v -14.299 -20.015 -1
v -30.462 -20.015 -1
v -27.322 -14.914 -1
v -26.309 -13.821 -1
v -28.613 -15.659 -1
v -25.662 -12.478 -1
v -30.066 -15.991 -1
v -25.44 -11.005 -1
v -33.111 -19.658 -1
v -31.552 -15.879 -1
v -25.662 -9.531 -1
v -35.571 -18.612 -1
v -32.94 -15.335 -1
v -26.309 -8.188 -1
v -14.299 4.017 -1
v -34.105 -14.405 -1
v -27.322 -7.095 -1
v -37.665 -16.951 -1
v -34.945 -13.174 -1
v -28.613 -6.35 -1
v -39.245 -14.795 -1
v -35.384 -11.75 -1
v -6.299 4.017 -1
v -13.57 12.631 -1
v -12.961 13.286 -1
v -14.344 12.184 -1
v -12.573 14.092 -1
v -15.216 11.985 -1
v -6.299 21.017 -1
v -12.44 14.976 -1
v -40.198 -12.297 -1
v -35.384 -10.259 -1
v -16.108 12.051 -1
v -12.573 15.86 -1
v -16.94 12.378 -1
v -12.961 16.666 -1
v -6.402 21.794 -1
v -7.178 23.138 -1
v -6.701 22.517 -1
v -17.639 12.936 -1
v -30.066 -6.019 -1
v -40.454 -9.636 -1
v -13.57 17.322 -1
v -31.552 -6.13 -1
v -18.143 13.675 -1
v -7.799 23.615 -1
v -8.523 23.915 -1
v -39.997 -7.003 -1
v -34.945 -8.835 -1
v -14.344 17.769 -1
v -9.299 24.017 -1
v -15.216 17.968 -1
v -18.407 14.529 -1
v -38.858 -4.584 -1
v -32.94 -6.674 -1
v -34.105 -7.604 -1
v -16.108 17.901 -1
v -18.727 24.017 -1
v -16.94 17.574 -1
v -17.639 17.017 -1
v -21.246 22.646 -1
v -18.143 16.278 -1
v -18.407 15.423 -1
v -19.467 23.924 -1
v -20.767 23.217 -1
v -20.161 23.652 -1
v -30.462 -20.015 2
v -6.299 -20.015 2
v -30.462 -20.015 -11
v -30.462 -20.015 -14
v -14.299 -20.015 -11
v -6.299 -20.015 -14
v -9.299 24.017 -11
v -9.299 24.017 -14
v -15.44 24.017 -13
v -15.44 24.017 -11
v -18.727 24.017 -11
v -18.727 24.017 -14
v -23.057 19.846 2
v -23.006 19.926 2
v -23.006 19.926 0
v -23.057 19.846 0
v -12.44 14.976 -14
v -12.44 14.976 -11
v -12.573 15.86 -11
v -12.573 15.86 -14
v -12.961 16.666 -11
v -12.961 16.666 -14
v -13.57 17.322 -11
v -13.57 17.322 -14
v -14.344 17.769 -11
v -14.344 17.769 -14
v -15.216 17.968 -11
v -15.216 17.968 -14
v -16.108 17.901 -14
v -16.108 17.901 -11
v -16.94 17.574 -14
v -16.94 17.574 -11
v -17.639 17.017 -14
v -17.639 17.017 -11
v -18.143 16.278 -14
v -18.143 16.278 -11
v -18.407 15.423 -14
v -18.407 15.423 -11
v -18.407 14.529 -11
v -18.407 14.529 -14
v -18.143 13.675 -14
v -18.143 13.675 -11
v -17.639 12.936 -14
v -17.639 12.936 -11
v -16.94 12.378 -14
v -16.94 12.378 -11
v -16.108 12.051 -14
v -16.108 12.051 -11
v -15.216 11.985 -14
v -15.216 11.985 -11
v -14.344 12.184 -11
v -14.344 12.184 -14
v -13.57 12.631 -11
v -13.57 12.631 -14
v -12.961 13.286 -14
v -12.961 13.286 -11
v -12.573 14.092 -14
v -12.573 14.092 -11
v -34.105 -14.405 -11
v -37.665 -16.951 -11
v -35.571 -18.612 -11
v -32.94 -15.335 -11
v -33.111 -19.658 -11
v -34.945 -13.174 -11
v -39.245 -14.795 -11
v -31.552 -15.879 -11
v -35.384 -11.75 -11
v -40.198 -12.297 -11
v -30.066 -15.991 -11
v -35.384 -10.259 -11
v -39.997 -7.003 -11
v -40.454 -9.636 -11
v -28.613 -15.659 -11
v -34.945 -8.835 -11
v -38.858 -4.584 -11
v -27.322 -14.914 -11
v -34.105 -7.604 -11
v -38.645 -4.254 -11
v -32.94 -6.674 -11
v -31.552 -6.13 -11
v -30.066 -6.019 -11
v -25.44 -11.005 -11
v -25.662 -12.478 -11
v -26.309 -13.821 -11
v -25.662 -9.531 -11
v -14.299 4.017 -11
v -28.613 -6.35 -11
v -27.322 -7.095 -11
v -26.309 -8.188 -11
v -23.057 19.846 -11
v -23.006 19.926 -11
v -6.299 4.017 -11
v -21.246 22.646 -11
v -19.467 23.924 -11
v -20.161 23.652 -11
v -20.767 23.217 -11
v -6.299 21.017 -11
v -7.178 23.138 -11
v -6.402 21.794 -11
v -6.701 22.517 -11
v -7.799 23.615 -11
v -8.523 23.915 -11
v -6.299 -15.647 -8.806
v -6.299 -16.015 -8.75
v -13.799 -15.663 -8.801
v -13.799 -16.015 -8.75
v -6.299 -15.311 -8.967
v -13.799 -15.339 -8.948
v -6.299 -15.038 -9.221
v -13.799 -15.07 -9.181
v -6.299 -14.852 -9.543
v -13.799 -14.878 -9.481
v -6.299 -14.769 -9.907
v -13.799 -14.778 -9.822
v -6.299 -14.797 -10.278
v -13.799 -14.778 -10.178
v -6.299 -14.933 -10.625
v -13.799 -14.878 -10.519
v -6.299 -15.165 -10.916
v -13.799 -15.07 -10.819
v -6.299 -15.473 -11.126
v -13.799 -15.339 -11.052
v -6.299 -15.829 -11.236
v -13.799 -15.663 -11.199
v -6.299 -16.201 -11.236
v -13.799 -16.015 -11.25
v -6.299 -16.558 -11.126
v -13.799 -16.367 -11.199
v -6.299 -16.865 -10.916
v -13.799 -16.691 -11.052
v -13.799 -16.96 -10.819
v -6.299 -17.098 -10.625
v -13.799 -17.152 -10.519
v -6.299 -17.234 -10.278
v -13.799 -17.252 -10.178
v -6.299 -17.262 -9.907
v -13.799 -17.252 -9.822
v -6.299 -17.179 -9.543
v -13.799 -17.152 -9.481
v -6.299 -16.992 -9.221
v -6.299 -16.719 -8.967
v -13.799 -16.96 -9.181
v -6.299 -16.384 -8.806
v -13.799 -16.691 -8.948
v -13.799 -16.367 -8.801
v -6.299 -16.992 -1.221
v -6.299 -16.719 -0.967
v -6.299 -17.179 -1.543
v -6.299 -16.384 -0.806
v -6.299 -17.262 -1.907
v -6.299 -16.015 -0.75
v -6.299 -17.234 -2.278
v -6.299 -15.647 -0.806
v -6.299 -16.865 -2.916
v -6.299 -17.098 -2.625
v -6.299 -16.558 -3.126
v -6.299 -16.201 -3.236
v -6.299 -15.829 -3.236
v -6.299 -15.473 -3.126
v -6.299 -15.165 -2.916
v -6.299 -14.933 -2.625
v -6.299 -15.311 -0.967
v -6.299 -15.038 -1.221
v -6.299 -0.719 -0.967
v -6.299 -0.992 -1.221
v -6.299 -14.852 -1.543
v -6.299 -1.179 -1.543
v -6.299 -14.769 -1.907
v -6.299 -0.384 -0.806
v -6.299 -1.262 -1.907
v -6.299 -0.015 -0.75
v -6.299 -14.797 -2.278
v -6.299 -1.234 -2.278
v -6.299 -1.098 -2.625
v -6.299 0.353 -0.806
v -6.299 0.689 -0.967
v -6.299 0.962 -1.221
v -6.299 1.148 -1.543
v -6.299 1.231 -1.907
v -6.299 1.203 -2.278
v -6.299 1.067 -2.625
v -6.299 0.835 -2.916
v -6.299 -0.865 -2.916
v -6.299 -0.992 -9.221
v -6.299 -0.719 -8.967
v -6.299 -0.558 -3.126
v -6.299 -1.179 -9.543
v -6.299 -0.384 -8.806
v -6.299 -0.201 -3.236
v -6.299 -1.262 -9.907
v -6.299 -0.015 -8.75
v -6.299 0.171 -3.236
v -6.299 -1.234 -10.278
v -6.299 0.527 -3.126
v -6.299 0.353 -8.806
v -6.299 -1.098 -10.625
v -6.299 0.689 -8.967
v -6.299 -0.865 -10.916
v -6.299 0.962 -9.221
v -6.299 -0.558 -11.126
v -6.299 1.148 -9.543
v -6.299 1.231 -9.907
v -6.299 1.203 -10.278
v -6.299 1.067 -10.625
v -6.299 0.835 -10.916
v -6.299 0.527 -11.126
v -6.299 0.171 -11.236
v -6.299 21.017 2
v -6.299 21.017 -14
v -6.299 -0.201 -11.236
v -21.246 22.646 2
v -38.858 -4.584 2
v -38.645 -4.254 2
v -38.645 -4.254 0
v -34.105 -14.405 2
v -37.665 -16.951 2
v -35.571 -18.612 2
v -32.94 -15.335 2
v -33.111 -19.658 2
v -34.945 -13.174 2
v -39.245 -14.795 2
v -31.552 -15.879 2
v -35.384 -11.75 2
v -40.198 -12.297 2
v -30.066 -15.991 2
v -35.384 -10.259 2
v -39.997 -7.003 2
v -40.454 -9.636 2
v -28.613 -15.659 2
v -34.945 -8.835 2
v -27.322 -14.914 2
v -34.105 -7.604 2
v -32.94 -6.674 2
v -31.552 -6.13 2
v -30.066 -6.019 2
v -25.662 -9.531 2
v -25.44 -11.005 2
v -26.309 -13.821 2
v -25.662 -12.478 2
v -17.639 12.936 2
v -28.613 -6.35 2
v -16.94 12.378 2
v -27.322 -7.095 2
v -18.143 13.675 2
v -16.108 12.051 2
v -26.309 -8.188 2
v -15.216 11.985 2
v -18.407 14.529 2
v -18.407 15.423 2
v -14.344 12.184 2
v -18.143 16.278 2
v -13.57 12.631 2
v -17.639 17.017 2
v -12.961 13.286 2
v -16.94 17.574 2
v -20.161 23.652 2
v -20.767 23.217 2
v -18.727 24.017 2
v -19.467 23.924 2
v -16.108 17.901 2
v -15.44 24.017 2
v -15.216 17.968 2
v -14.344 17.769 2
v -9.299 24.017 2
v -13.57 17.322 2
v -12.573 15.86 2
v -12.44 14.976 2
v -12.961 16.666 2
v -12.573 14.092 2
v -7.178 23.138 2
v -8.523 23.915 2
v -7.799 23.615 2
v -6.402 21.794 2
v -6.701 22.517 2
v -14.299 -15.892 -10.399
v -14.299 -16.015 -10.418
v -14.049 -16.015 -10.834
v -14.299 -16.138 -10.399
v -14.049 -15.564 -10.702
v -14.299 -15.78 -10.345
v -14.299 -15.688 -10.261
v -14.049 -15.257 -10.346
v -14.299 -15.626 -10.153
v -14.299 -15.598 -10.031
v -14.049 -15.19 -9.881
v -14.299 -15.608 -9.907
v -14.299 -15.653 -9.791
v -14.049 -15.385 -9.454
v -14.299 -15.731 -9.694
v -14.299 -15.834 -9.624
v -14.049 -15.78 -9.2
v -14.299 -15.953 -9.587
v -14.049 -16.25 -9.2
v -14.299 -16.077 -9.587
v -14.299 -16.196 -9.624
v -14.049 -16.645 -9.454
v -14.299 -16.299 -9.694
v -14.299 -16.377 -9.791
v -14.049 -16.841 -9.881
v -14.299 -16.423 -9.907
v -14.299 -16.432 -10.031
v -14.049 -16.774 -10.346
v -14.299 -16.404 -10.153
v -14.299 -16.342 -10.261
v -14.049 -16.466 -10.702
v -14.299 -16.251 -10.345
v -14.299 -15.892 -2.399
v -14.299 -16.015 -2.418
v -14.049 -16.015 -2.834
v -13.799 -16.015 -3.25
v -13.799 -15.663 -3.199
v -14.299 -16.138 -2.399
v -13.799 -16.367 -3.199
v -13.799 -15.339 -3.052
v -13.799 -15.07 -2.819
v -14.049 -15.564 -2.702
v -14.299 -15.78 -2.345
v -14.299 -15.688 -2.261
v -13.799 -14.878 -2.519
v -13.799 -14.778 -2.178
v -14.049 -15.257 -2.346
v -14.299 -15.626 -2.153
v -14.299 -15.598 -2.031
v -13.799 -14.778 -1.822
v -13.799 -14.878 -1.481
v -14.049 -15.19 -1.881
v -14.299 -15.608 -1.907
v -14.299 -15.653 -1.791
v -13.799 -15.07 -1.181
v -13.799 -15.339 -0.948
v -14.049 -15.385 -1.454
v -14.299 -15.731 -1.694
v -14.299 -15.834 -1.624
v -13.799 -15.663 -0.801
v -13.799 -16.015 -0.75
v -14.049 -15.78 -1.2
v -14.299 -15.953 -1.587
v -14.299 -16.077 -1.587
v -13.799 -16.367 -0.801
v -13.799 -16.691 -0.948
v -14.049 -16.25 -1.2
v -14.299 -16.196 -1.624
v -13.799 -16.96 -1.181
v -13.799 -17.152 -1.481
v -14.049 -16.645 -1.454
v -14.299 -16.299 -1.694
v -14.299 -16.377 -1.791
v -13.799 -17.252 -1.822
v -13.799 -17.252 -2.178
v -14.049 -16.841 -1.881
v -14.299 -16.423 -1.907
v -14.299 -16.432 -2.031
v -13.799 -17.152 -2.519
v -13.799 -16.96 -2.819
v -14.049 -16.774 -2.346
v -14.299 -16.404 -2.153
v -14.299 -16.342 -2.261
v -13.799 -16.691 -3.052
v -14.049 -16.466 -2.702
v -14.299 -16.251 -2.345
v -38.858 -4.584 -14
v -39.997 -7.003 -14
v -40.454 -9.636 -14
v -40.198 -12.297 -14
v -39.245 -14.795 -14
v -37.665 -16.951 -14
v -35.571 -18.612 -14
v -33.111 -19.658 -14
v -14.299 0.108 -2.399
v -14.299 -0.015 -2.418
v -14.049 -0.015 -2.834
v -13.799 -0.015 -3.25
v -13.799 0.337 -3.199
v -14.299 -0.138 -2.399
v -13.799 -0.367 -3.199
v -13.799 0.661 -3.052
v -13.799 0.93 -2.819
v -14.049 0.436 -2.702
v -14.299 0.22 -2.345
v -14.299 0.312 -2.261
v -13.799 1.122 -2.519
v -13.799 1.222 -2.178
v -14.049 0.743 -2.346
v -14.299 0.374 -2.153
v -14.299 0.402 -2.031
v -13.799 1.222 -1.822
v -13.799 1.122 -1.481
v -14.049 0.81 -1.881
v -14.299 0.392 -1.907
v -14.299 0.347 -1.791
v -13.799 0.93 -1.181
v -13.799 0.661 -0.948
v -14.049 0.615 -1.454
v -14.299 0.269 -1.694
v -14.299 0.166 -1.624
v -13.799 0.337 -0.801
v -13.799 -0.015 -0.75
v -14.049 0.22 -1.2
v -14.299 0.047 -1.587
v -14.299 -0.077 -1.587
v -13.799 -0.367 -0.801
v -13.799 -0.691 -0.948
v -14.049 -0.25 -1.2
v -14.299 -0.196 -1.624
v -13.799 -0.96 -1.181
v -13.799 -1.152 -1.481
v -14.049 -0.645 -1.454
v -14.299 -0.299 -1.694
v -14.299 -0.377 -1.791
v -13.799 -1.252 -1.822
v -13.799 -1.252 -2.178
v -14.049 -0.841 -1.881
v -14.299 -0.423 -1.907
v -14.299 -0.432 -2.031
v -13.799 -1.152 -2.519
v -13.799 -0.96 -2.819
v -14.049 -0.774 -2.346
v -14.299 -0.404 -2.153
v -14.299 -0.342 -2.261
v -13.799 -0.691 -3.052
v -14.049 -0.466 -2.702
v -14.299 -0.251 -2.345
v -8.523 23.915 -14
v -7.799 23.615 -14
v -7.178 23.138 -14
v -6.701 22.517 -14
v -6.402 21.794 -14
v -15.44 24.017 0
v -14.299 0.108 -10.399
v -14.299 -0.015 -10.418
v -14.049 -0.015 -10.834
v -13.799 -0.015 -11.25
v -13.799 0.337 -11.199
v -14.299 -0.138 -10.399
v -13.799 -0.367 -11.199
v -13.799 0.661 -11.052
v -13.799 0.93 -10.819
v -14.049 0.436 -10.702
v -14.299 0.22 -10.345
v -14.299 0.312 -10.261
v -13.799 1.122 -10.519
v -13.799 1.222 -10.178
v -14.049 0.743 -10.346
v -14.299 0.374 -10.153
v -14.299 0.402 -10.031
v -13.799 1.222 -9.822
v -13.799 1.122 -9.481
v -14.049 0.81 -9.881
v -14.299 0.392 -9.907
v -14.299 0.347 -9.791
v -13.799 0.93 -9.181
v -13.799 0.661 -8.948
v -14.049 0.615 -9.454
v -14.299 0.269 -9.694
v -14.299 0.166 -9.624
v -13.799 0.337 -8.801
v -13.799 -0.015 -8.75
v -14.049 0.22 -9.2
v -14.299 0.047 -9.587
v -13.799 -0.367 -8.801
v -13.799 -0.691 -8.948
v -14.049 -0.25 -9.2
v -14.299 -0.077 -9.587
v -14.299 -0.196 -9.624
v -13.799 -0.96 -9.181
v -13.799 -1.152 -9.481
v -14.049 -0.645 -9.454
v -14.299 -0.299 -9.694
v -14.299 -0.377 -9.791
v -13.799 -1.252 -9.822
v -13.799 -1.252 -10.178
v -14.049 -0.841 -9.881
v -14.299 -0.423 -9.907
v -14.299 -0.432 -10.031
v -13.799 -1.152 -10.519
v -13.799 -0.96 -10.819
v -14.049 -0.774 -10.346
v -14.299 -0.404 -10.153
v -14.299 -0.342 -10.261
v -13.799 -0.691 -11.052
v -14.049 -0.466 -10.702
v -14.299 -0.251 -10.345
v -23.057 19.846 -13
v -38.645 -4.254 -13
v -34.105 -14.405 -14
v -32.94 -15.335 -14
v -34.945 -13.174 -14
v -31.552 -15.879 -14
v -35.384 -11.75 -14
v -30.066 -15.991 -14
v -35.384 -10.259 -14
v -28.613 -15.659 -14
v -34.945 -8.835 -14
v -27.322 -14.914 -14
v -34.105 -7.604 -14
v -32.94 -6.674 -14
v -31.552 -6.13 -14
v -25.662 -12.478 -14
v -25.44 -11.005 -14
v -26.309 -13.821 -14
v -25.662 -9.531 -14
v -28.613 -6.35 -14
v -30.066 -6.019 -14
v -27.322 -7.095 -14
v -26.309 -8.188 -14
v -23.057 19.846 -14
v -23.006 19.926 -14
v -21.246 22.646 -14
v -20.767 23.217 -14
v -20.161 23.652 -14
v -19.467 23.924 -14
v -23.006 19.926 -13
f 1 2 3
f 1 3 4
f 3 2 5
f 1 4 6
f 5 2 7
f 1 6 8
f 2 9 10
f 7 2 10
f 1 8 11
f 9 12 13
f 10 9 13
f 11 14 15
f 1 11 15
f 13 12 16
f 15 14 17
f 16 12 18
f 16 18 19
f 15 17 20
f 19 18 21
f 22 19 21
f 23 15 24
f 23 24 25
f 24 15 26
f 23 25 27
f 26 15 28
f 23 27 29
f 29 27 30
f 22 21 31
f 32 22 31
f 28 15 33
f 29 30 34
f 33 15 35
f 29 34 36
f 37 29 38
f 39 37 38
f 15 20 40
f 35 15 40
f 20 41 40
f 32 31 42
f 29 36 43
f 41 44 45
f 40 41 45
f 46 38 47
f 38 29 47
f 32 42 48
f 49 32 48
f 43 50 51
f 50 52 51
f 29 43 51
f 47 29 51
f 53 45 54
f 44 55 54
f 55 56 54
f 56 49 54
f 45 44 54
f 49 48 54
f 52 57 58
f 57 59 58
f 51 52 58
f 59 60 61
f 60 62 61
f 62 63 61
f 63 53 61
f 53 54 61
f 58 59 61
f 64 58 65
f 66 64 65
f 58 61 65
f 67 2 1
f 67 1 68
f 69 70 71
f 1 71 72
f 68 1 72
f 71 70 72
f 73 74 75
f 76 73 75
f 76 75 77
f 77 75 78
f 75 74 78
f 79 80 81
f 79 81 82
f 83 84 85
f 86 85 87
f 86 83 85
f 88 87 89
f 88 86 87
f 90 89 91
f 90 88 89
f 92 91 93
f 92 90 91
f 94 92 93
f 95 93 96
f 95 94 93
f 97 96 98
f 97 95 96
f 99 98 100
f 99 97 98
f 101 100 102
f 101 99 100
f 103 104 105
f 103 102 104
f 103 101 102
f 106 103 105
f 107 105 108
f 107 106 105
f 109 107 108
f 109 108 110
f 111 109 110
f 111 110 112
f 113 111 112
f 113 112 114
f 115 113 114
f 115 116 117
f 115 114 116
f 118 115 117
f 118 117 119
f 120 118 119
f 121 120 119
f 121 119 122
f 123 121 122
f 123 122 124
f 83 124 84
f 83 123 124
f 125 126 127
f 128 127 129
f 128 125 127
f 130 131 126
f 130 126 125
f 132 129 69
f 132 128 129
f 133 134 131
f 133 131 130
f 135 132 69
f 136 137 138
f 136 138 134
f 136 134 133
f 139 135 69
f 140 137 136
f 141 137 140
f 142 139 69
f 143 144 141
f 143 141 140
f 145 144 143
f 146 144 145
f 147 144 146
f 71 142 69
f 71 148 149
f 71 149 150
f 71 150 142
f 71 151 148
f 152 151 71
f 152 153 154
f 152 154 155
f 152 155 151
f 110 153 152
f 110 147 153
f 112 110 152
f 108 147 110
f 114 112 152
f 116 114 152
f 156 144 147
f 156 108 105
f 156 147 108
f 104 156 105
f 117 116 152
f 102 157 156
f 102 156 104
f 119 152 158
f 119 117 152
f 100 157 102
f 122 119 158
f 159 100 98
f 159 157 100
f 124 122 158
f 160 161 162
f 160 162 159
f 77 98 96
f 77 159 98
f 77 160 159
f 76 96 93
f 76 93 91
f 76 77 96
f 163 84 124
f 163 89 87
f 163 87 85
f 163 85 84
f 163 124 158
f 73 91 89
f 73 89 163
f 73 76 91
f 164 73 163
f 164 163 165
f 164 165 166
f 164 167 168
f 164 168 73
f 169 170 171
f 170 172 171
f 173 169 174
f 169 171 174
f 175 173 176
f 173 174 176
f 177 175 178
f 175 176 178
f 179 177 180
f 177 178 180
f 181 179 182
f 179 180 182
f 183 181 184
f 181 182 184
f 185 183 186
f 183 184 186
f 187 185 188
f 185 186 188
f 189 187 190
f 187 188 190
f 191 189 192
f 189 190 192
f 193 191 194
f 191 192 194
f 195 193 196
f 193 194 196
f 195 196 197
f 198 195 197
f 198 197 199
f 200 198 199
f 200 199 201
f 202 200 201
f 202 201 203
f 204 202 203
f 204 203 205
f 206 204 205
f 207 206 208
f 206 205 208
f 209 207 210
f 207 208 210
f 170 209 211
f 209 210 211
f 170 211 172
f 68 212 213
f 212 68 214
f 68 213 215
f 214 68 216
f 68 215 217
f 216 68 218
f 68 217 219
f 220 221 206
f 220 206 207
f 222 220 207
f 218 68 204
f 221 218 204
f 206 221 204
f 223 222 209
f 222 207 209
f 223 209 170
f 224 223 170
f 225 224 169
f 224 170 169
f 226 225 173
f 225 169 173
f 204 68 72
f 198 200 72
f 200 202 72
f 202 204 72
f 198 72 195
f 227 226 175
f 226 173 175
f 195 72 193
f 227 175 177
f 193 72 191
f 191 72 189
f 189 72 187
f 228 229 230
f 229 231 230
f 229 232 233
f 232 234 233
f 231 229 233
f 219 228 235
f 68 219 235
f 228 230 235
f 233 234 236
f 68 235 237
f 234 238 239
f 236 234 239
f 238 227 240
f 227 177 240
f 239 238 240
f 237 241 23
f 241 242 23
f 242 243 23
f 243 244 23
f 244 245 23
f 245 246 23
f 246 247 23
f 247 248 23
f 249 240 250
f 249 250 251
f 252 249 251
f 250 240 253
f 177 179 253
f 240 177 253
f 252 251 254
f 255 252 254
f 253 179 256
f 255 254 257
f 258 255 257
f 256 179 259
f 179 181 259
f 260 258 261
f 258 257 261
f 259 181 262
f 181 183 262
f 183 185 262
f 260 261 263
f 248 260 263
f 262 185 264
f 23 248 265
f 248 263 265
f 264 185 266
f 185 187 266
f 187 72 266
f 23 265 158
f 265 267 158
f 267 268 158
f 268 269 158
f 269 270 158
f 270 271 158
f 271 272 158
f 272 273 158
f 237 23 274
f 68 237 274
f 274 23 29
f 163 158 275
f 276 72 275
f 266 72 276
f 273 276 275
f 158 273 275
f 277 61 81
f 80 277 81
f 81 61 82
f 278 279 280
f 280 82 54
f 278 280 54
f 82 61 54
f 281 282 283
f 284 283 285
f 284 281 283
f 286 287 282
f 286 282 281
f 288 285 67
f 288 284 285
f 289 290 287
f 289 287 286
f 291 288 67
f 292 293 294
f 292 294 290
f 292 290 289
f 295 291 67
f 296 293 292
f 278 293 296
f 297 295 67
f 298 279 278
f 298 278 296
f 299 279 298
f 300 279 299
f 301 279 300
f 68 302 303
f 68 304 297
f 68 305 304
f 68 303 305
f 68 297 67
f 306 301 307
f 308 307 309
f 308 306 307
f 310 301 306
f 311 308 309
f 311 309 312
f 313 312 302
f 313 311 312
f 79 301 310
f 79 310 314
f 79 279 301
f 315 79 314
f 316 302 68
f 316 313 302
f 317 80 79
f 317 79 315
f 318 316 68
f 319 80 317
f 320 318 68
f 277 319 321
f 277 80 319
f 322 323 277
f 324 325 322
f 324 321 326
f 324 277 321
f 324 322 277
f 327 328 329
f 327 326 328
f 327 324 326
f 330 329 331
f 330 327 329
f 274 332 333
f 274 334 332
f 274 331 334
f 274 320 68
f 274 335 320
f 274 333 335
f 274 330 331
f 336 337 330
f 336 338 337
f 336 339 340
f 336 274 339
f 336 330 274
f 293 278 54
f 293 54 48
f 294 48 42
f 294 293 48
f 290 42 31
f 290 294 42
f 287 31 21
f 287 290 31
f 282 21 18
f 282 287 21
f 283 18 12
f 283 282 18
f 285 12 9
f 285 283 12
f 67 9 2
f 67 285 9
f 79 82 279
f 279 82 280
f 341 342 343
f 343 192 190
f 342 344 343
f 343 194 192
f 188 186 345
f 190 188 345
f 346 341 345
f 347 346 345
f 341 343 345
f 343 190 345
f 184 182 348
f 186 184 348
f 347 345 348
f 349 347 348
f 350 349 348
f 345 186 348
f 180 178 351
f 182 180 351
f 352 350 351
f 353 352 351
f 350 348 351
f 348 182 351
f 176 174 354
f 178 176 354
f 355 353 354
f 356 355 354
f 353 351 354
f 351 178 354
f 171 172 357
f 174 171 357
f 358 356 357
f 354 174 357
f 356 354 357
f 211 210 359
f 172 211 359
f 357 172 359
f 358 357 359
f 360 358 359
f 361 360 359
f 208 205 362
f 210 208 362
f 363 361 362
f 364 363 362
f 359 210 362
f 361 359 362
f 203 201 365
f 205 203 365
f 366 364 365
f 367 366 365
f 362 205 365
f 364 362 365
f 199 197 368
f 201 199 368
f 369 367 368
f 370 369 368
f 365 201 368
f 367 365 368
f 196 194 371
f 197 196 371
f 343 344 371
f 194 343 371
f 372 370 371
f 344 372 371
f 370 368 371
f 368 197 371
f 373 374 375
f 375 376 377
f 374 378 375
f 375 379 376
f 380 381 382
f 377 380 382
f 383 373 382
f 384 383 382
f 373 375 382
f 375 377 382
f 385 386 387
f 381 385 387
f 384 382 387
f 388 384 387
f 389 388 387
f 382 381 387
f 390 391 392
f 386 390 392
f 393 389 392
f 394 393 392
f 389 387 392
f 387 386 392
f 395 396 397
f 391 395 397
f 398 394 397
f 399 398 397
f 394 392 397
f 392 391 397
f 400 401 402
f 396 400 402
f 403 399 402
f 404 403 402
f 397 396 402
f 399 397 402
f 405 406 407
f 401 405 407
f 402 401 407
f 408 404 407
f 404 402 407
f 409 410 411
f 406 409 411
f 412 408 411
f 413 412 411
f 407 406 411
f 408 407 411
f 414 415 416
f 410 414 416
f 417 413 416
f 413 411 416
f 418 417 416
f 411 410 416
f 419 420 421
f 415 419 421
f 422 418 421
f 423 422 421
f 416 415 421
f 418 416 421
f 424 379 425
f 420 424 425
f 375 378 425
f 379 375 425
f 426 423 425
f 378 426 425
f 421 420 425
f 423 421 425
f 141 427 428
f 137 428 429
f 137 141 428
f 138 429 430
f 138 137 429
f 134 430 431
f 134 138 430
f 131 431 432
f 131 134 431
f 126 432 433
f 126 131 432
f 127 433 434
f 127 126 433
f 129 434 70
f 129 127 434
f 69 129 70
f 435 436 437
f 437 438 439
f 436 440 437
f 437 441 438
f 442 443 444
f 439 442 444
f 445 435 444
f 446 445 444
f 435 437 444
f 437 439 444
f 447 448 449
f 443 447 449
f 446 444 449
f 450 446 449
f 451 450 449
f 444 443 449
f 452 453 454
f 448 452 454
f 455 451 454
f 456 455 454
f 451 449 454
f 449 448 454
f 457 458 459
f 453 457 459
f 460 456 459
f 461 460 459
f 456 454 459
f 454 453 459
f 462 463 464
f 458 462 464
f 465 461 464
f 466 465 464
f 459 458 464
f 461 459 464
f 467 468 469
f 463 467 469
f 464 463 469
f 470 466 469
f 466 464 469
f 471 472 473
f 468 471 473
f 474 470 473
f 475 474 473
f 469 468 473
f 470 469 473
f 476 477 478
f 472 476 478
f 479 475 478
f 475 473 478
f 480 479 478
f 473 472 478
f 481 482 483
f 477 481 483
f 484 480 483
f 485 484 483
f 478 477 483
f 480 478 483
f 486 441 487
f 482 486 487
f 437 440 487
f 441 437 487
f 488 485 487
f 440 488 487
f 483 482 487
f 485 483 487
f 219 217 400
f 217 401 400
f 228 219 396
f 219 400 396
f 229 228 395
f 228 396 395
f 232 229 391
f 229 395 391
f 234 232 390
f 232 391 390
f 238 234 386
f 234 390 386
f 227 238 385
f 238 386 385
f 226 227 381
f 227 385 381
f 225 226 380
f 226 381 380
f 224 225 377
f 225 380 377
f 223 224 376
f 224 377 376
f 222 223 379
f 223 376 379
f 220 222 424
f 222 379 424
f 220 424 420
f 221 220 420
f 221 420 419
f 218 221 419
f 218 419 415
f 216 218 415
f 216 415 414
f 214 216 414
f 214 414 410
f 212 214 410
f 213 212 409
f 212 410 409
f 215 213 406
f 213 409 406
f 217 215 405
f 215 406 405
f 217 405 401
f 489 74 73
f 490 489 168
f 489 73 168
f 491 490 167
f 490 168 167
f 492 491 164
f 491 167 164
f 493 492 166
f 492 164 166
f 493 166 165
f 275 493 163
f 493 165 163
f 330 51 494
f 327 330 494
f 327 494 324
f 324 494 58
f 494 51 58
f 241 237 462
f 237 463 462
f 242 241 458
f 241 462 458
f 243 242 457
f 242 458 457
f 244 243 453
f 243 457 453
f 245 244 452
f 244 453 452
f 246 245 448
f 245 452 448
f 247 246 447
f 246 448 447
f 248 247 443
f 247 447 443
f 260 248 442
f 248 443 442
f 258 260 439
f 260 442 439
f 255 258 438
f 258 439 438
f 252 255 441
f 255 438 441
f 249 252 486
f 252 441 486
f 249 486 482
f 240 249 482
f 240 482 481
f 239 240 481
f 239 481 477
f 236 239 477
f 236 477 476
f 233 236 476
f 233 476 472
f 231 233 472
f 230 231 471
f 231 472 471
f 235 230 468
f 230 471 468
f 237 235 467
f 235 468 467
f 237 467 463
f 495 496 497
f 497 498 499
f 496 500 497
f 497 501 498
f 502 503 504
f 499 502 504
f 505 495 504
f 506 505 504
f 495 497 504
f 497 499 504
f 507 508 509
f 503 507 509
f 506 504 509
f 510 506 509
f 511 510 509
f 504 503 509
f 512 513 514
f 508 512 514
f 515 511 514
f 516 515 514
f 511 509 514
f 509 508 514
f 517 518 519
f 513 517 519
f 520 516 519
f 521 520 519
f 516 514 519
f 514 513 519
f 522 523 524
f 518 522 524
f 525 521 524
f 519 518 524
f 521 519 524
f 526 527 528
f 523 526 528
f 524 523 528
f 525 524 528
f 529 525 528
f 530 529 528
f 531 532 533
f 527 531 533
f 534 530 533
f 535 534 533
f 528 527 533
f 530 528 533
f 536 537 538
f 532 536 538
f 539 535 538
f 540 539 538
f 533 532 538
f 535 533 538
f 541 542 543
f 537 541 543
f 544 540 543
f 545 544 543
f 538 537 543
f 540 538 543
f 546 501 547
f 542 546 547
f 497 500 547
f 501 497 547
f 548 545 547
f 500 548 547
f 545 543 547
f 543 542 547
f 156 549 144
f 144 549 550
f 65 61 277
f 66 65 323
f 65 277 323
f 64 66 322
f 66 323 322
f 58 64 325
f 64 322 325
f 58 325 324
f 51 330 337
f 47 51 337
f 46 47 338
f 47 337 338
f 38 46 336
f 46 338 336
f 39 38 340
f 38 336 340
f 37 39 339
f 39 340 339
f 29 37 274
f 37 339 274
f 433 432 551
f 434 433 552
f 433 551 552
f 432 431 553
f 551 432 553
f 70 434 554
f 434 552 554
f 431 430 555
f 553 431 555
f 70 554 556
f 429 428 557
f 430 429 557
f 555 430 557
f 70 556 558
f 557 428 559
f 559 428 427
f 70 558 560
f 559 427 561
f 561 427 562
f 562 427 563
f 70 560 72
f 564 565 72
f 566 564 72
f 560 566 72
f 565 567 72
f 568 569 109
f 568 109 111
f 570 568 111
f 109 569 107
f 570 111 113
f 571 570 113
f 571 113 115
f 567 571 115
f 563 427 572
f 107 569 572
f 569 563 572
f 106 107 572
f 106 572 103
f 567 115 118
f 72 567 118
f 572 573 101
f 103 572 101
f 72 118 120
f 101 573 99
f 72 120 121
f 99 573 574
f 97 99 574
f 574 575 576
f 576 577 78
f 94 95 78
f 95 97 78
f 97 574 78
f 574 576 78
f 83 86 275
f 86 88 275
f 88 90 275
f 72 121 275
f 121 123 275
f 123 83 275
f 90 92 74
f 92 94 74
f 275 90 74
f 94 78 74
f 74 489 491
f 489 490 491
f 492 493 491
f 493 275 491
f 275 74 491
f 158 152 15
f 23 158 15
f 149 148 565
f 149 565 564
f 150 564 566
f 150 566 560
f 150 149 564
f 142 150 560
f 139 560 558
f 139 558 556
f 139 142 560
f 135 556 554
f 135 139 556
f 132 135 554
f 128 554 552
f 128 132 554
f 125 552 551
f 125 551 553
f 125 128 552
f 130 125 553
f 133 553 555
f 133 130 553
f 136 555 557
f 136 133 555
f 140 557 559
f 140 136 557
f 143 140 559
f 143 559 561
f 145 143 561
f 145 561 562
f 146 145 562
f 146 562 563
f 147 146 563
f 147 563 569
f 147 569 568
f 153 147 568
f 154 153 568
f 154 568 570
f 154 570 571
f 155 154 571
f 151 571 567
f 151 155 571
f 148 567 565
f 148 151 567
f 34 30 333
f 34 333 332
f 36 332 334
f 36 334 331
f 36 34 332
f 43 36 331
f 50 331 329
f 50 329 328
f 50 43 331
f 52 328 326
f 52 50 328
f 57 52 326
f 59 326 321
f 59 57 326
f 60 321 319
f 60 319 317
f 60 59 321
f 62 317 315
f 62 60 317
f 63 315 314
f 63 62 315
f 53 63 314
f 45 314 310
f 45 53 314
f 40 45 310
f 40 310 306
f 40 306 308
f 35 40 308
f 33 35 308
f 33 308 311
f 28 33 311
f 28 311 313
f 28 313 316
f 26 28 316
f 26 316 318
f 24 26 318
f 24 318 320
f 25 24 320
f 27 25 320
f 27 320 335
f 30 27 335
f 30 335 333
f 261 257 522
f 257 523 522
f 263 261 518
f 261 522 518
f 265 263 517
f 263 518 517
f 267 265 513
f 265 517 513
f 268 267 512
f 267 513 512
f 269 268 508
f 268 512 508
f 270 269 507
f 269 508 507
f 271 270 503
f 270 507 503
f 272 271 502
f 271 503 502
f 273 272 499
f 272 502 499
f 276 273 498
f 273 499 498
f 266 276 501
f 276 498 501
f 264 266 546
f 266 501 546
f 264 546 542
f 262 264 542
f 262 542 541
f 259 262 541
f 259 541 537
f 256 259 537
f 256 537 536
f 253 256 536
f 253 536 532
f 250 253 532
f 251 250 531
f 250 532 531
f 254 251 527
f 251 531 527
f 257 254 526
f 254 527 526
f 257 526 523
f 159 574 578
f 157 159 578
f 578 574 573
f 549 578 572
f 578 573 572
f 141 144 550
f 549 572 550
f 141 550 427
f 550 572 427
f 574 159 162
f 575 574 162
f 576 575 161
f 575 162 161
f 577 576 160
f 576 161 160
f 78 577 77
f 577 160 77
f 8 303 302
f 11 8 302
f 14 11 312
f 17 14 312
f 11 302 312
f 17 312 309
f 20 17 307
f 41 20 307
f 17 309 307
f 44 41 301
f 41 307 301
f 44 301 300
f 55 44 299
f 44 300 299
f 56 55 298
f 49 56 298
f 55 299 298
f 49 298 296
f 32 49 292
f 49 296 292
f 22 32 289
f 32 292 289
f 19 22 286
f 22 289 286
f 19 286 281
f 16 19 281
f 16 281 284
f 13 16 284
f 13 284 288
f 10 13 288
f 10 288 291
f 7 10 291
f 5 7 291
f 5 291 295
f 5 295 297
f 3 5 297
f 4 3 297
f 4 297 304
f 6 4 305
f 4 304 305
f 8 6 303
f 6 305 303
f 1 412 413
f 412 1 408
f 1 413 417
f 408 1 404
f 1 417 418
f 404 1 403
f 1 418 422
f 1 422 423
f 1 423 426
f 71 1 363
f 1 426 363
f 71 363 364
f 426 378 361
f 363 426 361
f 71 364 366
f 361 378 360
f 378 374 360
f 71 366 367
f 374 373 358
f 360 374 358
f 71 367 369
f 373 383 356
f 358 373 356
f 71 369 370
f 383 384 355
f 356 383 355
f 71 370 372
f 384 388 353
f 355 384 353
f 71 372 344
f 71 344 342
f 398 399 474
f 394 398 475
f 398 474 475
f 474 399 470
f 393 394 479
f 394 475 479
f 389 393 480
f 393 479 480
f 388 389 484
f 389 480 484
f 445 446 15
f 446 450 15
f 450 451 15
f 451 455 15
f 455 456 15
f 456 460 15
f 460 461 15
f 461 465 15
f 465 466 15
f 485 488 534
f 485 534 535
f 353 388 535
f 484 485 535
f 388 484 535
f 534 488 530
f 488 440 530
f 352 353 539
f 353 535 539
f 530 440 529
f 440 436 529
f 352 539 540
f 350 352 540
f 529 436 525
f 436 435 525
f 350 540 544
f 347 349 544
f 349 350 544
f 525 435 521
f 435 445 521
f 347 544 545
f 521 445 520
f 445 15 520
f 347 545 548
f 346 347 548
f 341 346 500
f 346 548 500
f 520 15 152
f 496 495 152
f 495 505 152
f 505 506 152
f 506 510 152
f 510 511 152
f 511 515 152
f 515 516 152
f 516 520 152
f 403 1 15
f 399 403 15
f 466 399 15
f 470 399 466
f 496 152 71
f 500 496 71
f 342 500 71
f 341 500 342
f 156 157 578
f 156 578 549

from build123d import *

# Parameters (mm, degrees)
SKETCH_1_R             = 3
EXTRUDE_1_DEPTH        = 2
SKETCH_2_W             = 53.96
SKETCH_2_H             = 15
SKETCH_2_R             = 1.6
SKETCH_2_R_2           = 1
EXTRUDE_2_DEPTH        = 2
PATTERN_LINEAR_1_COUNT = 2
PATTERN_LINEAR_1_PITCH = 13
FILLET_1_R             = 1
EXTRUDE_START          = -16
SKETCH_4_R             = 3
EXTRUDE_3_DEPTH        = 16
SKETCH_5_W             = 71.597299473
SKETCH_5_H             = 10
CUT_EXTRUDE_1_DEPTH    = 15
SKETCH_6_R             = 5
CUT_EXTRUDE_2_DEPTH    = 3
CUT_EXTRUDE_START      = -3
SKETCH_7_R             = 5
CUT_EXTRUDE_3_DEPTH    = 3
FILLET_2_R             = 10
SKETCH_8_W             = 2
SKETCH_8_H             = 0.095117033
EXTRUDE_5_DEPTH        = 0.002
CUT_EXTRUDE_4_DEPTH    = 16
FILLET_3_R             = 3
CUT_EXTRUDE_5_REACH    = 63.416
SKETCH_11_W            = 36.223911337
SKETCH_11_H            = 10
SKETCH_14_W            = 10
SKETCH_14_H            = 20
CUT_EXTRUDE_6_DEPTH    = 8
HOLE_WIZARD_M3_1_D     = 2.5
HOLE_WIZARD_M3_1_DEPTH = 7.5
HOLE_WIZARD_M3_1_TIP   = 0.751075774


with BuildPart() as part:
    # 草图1 → 凸台-拉伸1 (new body)
    with BuildSketch(Plane.XY):
        with BuildLine():
            Line((-31.667580782, -19.712759913), (-15.214545893, -22.177554229))
            Line((-15.214545893, -22.177554229), (-14.362700527, -22.30516738))
            Line((-14.362700527, -22.30516738), (-14.362700527, -23.166518437))
            Line((-14.362700527, -23.166518437), (-14.362700527, -25.01516738))
            Line((-14.362700527, -25.01516738), (39.597299473, -25.01516738))
            Line((39.597299473, -25.01516738), (39.597299473, -20.01516738))
            Line((39.597299473, -20.01516738), (-6.399297664, -20.01516738))
            Line((-6.399297664, -20.01516738), (-6.399297664, 14.684969608))
            ThreePointArc((-6.399297664, 14.684969608), (-6.397869517, 15.219044335), (-6.427963434, 15.752272438))
            ThreePointArc((-6.427963434, 15.752272438), (-6.435285609, 15.800138476), (-6.441446817, 15.848167752))
            ThreePointArc((-6.441446817, 15.848167752), (-13.325191112, 23.766199394), (-23.057324529, 19.846156059))
            Line((-23.057324529, 19.846156059), (-38.645044316, -4.254376507))
            ThreePointArc((-38.645044316, -4.254376507), (-39.369264732, -13.885171984), (-31.667580782, -19.712759913))
        make_face()
        with Locations((-30.439815615, -11.004528038)):
            Circle(SKETCH_1_R, mode=Mode.SUBTRACT)
        with Locations((-15.440178747, 14.976184715)):
            Circle(SKETCH_1_R, mode=Mode.SUBTRACT)
    extrude_1 = extrude(amount=EXTRUDE_1_DEPTH)

    # 草图2 → 凸台-拉伸2 (add)
    with BuildSketch(Plane.XZ.offset(25.01516738)):
        with Locations((12.617299473, -5.5)):
            Rectangle(SKETCH_2_W, SKETCH_2_H)
        with Locations(Location((26.637299473, -5.5, 0), (0, 0, 270))):
            Circle(SKETCH_2_R, mode=Mode.SUBTRACT)
        with Locations(Location((-9.362700527, -5.5, 0), (0, 0, 270))):
            Circle(SKETCH_2_R, mode=Mode.SUBTRACT)
        with Locations(Location((-3.141180602, -5.5, 0), (0, 0, 270))):
            Circle(SKETCH_2_R_2, mode=Mode.SUBTRACT)
        with Locations(Location((20.358819398, -5.5, 0), (0, 0, 270))):
            Circle(SKETCH_2_R_2, mode=Mode.SUBTRACT)
        with BuildLine():
            Line((3.367759388, -1.25), (-1.491180602, -1.25))
            Line((-1.491180602, -1.25), (-1.491180602, -9.75))
            Line((-1.491180602, -9.75), (3.367759388, -9.75))
            ThreePointArc((3.367759388, -9.75), (6.858819398, -11), (10.349879409, -9.75))
            Line((10.349879409, -9.75), (18.708819398, -9.75))
            Line((18.708819398, -9.75), (18.708819398, -1.25))
            Line((18.708819398, -1.25), (10.349879409, -1.25))
            ThreePointArc((10.349879409, -1.25), (6.858819398, 0), (3.367759388, -1.25))
        make_face(mode=Mode.SUBTRACT)
    extrude(amount=-EXTRUDE_2_DEPTH)

    # 阵列(线性)1: 凸台-拉伸1 ×2
    with Locations(*[(0, 0, -i * PATTERN_LINEAR_1_PITCH) for i in range(1, PATTERN_LINEAR_1_COUNT)]):
        add(extrude_1)

    # 圆角1
    fillet_1_edges = [part.edges().sort_by_distance(p)[0] for p in [
        (-14.362700527, -22.30516738, -12),
    ]]
    fillet(fillet_1_edges, radius=FILLET_1_R - 0.0004)  # a hair under: the kernel refuses the full size

    # 草图4 → 凸台-拉伸3 (add)
    with BuildSketch(Plane.XY.offset(2).offset(EXTRUDE_START)):
        Polygon((-20.359667451, 24.017065798), (-48.838793814, -20.01516738), (-6.299297664, -20.01516738), (-6.299297664, 24.017065798), align=None)
        with Locations((-15.440178747, 14.976184715)):
            Circle(SKETCH_4_R, mode=Mode.SUBTRACT)
        with Locations((-30.439815615, -11.004528038)):
            Circle(SKETCH_4_R, mode=Mode.SUBTRACT)
    extrude(amount=EXTRUDE_3_DEPTH)

    # 草图5 → 切除-拉伸1 (cut)
    with BuildSketch(Plane.XY.offset(2)):
        with Locations((3.798649736, -25.01516738)):
            Rectangle(SKETCH_5_W, SKETCH_5_H)
    extrude(amount=-CUT_EXTRUDE_1_DEPTH, mode=Mode.SUBTRACT)

    # 草图6 → 切除-拉伸2 (cut)
    with BuildSketch(Plane.XY.offset(2)):
        with Locations((-30.439815615, -11.004528038)):
            Circle(SKETCH_6_R)
    extrude(amount=-CUT_EXTRUDE_2_DEPTH, mode=Mode.SUBTRACT)

    # 草图7 → 切除-拉伸3 (cut)
    with BuildSketch(Plane(origin=(0, 0, -14), x_dir=(-1, 0, 0), z_dir=(0, 0, -1)).offset(CUT_EXTRUDE_START)):
        with Locations(Location((30.439815615, -11.004528038, 0), (0, 0, 180))):
            Circle(SKETCH_7_R)
    extrude(amount=CUT_EXTRUDE_3_DEPTH, mode=Mode.SUBTRACT)

    # 圆角2
    fillet_2_edges = [part.edges().sort_by_distance(p)[0] for p in [
        (-48.838793814, -20.01516738, -6),
    ]]
    fillet(fillet_2_edges, radius=FILLET_2_R)

    # 草图8 → 凸台-拉伸5 (add)
    with BuildSketch(Plane(origin=(-25.306928561, 16.367991454, 0), x_dir=(0, 0, 1), z_dir=(-0.8396772833764469, 0.5430856836462826, 0))):
        with Locations((-12, 4.189822066)):
            Rectangle(SKETCH_8_W, SKETCH_8_H)
        with Locations((1, 4.189822066)):
            Rectangle(SKETCH_8_W, SKETCH_8_H)
    extrude(amount=EXTRUDE_5_DEPTH)

    # 草图9 → 切除-拉伸4 (cut)
    with BuildSketch(Plane.XY.offset(2)):
        Polygon((-23.00566783, 19.926023671), (-23.057324529, 19.846156059), (-23.897001813, 20.389241743), (-23.845345113, 20.469109355), align=None)
    extrude(amount=-CUT_EXTRUDE_4_DEPTH, mode=Mode.SUBTRACT)

    # 圆角3
    fillet_3_edges = [part.edges().sort_by_distance(p)[0] for p in [
        (-20.359667451, 24.017065798, -6),
        (-6.299297664, 24.017065798, -6),
    ]]
    fillet(fillet_3_edges, radius=FILLET_3_R)

    # 切除-拉伸5: up to this face of the body (flat: up to its plane)
    cut_extrude_5_end = Plane(part.part.faces().sort_by_distance((-18.380481786, -20.01516738, -6))[0])
    # 草图11 → 切除-拉伸5 (cut, up to the picked face)
    with BuildSketch(Plane(origin=(0, 24.017065798, 0), x_dir=(1, 0, 0), z_dir=(0, 1, 0)), mode=Mode.PRIVATE) as cut_extrude_5_sk1:
        with Locations((-32.411253333, 6)):
            Rectangle(SKETCH_11_W, SKETCH_11_H)
    cut_extrude_5_tool1 = split(extrude(cut_extrude_5_sk1.sketch, amount=-CUT_EXTRUDE_5_REACH, mode=Mode.PRIVATE), bisect_by=cut_extrude_5_end, keep=Keep.BOTH, mode=Mode.PRIVATE)
    add(cut_extrude_5_tool1.solids().sort_by(Axis((-32.411253, 24.017066, -6), (0, -1, 0)))[0], mode=Mode.SUBTRACT)

    # 草图14 → 切除-拉伸6 (cut)
    with BuildSketch(Plane.ZY.offset(14.299297664)):
        with Locations((-6, 14.017065798)):
            Rectangle(SKETCH_14_W, SKETCH_14_H)
    extrude(amount=-CUT_EXTRUDE_6_DEPTH, mode=Mode.SUBTRACT)

    # M3 螺纹孔1
    with Locations(Plane(origin=(-6.299297664, 0, 0), x_dir=(0, 0, -1), z_dir=(1, 0, 0))):
        with Locations((2, -0.01516738), (10, -0.01516738), (2, -16.01516738), (10, -16.01516738)):
            Hole(HOLE_WIZARD_M3_1_D / 2, depth=HOLE_WIZARD_M3_1_DEPTH)
            with Locations((0, 0, -(HOLE_WIZARD_M3_1_DEPTH + HOLE_WIZARD_M3_1_TIP / 2))):  # 118° drill point
                Cone(0, HOLE_WIZARD_M3_1_D / 2, HOLE_WIZARD_M3_1_TIP, mode=Mode.SUBTRACT)


solid = part.part
